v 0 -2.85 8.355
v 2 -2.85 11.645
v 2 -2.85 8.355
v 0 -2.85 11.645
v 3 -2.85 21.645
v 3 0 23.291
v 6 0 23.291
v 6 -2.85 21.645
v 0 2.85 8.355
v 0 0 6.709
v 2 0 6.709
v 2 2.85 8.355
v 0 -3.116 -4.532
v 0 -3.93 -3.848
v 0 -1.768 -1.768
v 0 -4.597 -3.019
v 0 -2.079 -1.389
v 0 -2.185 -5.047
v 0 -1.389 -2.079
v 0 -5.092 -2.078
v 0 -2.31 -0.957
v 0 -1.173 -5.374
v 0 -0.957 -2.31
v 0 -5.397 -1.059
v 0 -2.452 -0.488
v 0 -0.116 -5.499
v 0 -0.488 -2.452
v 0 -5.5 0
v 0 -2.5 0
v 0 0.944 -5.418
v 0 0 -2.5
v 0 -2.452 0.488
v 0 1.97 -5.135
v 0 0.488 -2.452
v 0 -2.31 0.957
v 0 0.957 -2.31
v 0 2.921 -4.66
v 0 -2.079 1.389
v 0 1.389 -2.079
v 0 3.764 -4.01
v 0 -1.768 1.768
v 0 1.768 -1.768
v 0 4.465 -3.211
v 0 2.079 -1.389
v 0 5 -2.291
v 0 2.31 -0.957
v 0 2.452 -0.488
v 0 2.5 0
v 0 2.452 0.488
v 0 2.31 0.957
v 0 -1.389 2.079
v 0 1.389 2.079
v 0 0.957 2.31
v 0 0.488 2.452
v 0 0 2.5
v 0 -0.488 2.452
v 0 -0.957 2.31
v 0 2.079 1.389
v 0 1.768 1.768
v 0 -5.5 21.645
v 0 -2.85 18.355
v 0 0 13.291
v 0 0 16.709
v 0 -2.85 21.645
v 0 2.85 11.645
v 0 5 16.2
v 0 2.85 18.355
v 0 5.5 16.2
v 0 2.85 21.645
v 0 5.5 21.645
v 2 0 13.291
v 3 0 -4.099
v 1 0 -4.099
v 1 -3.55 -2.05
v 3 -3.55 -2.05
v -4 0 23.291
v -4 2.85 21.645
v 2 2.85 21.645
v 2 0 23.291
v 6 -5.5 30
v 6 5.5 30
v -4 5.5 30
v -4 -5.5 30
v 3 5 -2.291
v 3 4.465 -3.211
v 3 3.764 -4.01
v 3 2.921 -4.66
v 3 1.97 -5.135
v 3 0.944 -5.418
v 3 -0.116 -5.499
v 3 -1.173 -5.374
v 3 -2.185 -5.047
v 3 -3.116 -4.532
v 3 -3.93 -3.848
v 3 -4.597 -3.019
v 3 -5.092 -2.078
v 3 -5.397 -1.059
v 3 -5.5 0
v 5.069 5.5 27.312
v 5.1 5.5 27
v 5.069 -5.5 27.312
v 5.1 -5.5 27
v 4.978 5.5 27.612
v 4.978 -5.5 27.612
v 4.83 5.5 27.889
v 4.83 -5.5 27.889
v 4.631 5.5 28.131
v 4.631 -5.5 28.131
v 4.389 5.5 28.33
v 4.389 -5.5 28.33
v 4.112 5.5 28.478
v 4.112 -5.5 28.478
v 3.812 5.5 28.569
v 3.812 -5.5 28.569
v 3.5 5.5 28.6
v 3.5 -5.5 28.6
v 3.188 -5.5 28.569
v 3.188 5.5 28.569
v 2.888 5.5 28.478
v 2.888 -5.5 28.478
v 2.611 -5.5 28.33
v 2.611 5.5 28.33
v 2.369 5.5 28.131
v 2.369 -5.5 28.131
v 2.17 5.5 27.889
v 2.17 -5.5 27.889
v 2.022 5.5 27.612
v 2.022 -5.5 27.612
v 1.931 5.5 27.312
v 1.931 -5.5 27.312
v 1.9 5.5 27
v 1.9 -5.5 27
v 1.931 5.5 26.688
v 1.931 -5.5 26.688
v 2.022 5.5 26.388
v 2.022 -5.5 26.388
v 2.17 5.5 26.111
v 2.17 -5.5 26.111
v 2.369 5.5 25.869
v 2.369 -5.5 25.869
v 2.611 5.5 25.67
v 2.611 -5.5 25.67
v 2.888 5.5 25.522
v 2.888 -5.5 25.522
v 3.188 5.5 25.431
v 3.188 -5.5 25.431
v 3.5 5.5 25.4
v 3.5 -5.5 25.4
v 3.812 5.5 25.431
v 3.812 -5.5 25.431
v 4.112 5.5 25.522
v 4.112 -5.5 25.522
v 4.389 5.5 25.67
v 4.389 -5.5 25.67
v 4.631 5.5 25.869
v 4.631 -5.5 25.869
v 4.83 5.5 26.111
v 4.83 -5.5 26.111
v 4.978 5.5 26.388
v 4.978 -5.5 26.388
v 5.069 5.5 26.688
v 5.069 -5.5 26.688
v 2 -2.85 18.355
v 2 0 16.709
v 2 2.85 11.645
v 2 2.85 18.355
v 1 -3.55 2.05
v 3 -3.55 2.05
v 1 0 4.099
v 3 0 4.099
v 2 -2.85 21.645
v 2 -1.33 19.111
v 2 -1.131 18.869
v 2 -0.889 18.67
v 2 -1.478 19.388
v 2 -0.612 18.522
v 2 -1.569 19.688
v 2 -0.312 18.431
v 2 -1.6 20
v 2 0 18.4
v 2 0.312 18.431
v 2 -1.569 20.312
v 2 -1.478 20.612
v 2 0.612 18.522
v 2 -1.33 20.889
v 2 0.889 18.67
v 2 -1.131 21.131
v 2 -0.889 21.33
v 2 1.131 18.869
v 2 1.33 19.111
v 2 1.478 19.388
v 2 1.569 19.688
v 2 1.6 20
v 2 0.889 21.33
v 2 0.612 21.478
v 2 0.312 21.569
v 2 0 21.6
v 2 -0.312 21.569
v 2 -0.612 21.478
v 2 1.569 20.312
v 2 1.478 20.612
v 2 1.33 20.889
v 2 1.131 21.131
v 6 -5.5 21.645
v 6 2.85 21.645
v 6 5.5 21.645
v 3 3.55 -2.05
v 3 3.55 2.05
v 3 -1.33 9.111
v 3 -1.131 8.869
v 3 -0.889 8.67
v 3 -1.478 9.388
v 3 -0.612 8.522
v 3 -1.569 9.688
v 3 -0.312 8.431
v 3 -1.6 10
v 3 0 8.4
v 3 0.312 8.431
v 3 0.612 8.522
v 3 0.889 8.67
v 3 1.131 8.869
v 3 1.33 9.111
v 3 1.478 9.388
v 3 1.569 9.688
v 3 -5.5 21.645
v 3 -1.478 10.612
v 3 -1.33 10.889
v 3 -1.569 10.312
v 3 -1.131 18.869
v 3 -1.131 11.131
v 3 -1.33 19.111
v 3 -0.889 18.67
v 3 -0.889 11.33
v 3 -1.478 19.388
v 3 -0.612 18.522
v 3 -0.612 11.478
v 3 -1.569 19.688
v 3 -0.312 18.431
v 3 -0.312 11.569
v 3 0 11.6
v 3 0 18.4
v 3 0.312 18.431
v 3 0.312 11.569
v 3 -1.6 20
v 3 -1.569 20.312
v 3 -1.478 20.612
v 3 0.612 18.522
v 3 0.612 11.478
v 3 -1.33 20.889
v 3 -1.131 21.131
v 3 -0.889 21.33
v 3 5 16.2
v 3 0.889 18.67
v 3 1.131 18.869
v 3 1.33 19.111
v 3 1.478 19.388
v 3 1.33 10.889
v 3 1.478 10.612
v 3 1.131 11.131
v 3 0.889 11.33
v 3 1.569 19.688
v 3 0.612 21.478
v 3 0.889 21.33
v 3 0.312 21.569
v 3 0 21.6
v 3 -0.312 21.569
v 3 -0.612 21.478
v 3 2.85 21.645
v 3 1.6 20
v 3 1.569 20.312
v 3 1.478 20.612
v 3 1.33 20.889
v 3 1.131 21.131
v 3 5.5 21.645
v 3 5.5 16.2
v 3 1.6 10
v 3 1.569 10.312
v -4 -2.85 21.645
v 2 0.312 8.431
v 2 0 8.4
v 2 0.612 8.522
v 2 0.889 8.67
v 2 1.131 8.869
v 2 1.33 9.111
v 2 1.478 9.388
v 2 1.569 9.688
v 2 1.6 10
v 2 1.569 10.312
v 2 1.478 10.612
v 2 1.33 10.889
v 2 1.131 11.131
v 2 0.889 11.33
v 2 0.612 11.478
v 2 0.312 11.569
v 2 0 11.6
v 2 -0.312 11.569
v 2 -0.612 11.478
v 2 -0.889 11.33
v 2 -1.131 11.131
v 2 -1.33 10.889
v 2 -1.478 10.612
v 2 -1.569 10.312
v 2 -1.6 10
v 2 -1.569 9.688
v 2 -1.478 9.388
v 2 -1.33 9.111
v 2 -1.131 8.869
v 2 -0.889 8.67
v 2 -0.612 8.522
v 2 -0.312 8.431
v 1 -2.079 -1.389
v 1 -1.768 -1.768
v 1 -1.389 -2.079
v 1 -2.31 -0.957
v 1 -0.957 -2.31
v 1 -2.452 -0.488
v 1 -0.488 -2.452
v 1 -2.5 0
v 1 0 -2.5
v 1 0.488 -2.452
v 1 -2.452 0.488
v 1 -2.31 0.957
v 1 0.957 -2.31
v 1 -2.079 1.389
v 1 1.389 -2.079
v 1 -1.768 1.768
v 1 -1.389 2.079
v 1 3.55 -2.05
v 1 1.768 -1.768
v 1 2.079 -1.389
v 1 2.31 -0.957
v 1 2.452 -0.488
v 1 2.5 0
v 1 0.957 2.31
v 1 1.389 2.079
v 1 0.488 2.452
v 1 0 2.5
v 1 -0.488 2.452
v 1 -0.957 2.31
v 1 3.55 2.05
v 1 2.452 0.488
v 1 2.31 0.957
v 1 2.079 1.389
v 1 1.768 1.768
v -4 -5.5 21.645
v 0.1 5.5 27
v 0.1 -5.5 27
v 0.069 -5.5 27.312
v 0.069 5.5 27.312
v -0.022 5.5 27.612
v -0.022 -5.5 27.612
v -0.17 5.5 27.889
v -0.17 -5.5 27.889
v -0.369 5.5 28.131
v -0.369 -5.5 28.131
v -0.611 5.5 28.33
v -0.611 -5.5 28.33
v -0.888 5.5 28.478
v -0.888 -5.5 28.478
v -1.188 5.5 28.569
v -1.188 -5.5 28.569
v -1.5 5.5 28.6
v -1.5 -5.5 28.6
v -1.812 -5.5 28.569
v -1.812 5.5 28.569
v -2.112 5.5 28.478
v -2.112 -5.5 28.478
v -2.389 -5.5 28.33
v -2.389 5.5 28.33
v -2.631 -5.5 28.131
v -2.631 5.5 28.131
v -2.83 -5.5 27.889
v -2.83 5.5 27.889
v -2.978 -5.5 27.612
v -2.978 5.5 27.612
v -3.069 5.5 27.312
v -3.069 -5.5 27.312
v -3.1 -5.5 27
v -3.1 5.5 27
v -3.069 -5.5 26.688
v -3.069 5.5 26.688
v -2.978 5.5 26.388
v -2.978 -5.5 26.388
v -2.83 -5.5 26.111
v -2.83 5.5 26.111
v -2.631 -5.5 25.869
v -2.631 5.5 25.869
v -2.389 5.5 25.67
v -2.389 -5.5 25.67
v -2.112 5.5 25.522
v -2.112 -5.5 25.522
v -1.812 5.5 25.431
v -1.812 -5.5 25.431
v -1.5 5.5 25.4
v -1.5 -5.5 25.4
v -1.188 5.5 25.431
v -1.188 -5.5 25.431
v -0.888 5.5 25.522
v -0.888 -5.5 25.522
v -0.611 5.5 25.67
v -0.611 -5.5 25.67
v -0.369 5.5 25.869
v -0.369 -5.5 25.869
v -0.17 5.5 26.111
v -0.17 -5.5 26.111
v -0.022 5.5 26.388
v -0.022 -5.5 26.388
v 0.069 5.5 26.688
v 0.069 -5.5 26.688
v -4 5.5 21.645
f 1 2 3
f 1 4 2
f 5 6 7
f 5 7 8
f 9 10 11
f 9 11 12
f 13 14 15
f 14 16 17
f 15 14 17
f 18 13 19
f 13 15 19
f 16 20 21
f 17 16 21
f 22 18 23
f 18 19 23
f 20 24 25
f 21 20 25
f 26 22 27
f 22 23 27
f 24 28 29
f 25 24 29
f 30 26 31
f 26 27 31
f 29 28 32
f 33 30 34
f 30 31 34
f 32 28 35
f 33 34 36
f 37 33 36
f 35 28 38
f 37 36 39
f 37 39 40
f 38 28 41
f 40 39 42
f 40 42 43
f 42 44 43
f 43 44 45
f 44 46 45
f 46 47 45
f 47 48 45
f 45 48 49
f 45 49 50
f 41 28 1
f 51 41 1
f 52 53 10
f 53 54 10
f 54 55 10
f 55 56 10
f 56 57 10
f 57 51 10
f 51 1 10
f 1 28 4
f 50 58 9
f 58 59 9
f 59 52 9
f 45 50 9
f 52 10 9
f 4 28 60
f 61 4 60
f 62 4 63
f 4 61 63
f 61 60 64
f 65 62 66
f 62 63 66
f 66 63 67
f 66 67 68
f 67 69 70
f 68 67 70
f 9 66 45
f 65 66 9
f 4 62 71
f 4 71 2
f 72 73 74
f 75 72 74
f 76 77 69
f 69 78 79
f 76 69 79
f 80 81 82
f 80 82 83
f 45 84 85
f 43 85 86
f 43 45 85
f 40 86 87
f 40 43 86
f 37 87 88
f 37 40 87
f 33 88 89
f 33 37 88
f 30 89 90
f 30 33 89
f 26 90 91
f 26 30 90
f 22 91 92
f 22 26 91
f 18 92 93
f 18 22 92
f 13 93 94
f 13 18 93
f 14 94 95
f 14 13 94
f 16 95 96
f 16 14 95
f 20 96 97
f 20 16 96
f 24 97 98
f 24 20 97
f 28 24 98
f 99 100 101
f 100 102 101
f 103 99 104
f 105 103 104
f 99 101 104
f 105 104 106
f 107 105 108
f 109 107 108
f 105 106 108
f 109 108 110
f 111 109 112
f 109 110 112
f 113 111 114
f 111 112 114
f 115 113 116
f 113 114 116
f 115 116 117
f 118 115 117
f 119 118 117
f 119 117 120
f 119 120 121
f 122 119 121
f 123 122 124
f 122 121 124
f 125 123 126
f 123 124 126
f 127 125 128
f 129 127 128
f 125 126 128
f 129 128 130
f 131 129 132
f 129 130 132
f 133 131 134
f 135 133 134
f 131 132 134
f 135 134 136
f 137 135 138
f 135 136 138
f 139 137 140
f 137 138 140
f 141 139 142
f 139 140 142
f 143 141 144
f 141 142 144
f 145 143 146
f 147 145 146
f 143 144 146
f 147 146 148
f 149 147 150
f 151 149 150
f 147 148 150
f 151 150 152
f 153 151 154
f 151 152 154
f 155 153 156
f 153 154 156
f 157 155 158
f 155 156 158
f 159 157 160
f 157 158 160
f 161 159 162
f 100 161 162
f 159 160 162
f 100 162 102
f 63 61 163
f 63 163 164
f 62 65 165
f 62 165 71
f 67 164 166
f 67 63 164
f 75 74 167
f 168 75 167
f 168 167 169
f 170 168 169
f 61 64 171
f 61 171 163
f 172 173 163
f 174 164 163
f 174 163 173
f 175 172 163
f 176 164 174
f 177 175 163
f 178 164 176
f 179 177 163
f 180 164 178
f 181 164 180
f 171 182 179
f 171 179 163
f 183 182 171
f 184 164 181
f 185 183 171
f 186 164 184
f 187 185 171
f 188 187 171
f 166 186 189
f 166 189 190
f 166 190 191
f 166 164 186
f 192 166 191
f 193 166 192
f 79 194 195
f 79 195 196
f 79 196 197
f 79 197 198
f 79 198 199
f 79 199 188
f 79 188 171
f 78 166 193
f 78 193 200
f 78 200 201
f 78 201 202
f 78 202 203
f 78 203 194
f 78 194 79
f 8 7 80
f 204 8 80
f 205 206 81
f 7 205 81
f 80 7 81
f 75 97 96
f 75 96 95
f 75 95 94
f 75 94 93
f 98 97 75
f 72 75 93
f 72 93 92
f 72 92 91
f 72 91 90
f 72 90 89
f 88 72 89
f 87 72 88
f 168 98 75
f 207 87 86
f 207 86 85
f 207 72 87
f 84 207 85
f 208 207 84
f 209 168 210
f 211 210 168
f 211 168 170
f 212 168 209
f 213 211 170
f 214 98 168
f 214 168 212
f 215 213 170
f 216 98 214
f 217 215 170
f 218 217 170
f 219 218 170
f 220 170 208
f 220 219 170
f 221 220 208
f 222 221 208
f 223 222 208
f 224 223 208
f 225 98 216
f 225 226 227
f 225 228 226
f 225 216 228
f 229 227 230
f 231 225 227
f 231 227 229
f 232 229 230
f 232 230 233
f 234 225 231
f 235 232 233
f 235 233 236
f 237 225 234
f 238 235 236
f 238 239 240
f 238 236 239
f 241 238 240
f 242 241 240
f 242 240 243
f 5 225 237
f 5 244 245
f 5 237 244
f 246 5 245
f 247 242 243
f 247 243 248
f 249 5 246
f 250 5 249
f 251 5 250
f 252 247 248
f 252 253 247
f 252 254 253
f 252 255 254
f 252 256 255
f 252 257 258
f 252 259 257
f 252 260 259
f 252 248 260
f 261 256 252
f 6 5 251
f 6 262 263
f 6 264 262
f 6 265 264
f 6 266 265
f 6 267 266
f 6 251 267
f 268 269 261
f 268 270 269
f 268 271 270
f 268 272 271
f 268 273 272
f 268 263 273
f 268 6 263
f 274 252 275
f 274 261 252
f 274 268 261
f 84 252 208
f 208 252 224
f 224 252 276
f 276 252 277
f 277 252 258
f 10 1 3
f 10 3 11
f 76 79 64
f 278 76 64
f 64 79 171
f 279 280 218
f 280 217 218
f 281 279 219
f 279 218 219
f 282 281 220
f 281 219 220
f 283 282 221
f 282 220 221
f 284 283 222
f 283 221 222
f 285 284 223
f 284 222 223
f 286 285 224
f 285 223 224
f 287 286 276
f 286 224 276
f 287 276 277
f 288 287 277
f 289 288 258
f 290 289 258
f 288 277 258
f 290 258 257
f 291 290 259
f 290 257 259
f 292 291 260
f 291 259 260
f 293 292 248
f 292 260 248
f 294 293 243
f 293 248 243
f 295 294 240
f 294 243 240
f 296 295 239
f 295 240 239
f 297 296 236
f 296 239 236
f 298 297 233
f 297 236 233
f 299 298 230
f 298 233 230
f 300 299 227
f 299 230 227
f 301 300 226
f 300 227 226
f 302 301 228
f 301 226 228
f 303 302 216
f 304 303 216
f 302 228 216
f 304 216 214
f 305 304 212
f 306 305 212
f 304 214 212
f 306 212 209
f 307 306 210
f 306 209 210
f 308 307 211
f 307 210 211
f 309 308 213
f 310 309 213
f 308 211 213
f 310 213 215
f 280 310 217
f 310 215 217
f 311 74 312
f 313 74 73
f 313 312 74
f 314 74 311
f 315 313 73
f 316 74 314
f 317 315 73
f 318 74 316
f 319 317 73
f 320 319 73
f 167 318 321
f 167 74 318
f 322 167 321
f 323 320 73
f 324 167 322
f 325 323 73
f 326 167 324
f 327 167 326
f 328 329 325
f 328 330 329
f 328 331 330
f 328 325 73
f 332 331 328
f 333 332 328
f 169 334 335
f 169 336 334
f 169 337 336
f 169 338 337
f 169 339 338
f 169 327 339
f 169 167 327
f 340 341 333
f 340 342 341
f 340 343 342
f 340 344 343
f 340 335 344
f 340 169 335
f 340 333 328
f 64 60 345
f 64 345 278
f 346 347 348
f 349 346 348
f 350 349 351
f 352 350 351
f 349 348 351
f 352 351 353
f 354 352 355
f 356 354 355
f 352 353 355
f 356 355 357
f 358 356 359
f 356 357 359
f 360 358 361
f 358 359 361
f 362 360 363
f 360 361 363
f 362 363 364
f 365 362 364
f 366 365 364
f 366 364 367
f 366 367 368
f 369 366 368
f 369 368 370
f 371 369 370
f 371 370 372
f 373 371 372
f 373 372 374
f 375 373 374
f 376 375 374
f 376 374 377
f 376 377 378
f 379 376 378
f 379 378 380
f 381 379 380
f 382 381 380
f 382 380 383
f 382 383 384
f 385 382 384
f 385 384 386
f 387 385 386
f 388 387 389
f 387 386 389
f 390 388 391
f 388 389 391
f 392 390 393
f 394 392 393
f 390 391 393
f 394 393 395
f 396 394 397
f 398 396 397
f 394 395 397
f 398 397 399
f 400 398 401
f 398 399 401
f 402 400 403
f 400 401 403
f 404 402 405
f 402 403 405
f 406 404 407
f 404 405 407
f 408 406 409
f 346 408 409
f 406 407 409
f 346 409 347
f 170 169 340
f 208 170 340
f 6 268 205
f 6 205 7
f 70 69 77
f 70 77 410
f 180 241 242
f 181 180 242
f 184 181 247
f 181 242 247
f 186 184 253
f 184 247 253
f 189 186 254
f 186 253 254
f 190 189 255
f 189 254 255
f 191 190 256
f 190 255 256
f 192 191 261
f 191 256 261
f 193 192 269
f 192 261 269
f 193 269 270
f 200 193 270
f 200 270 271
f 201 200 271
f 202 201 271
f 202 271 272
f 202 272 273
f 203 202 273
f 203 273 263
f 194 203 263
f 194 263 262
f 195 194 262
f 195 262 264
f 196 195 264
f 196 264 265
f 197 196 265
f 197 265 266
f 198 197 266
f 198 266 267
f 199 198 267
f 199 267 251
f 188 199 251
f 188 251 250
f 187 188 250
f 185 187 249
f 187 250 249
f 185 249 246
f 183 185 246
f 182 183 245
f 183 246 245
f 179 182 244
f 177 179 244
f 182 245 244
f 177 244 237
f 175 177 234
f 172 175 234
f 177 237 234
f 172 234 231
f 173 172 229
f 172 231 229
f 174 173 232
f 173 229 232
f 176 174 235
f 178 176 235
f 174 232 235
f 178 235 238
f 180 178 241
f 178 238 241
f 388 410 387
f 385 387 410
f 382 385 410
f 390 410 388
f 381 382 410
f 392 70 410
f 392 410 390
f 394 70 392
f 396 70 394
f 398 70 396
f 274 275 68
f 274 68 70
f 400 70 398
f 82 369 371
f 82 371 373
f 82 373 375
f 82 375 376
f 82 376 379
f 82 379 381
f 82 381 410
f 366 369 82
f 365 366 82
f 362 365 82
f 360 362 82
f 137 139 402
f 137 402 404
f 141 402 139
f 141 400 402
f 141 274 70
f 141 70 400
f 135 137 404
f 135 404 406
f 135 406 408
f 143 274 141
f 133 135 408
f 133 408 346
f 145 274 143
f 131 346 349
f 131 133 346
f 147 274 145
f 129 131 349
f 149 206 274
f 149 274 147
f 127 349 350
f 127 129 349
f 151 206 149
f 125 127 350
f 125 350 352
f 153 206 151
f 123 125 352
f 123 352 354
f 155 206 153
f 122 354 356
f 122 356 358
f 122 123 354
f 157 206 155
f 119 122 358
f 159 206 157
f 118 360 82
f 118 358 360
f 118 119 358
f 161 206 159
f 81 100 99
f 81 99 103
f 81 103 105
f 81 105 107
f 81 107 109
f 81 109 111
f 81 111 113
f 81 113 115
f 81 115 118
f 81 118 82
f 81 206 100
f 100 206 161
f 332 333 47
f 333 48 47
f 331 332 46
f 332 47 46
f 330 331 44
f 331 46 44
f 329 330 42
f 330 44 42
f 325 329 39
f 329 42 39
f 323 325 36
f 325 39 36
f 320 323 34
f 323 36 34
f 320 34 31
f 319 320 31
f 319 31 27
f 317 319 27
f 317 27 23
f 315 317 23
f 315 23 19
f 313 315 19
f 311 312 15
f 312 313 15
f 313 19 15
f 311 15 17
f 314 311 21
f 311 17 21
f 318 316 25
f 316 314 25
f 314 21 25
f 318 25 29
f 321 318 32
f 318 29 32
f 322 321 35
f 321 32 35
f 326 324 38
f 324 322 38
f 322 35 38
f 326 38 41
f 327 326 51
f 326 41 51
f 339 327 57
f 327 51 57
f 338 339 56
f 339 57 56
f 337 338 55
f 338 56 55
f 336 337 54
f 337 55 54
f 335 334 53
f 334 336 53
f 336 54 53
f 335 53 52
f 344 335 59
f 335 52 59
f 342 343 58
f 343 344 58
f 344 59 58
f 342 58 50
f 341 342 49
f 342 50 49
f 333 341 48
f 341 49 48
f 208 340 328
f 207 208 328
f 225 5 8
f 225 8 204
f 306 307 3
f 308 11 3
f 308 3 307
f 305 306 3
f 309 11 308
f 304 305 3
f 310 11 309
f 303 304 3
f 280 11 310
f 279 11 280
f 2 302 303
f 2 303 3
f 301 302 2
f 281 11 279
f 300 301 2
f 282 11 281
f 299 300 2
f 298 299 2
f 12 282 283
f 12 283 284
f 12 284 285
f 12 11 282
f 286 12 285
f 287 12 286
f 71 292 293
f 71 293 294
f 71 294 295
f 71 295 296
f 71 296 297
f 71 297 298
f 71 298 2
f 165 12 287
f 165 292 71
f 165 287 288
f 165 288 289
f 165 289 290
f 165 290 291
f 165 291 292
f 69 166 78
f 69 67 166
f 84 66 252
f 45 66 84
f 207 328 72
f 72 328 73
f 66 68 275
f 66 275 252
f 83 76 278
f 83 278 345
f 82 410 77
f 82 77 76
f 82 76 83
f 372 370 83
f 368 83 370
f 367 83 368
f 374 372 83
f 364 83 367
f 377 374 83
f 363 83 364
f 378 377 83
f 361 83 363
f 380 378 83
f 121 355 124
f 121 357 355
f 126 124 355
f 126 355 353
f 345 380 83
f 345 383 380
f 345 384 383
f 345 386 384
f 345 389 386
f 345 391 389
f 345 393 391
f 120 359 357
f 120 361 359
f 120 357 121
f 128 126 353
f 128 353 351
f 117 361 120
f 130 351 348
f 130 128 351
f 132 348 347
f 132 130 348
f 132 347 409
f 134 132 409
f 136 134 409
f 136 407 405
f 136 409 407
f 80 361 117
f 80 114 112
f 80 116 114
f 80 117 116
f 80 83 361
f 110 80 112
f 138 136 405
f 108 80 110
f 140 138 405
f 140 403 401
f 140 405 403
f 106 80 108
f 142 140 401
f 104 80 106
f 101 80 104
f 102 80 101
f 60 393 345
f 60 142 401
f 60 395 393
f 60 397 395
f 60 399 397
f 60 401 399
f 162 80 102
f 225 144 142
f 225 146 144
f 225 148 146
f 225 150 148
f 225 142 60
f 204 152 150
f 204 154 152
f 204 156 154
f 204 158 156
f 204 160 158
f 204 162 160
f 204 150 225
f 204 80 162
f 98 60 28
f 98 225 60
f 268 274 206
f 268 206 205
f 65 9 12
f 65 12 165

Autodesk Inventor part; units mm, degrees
ref_plane "YZ Plane" through (0, 0, 0) normal (1, 0, 0) x (0, 1, 0)
ref_plane "XZ Plane" through (0, 0, 0) normal (0, 1, 0) x (-1, 0, 0)
ref_plane "XY Plane" through (0, 0, 0) normal (0, 0, 1) x (1, 0, 0)
sketch "スケッチ1" plane through (0, 0, 0) normal (1, 0, 0) x (0, 1, 0)
  circle A0 centre (0, 0) radius 2.5
  line L0 (0, 4.0992) -> (3.55, 2.0496)
  line L1 (3.55, 2.0496) -> (3.55, -2.0496)
  line L2 (3.55, -2.0496) -> (0, -4.0992)
  line L3 (0, -4.0992) -> (-3.55, -2.0496)
  line L4 (-3.55, -2.0496) -> (-3.55, 2.0496)
  line L5 (-3.55, 2.0496) -> (0, 4.0992)
  circle A1 centre (0, 0) radius 5.5
  line L6 (5.5, 0) -> (-5.5, 0) construction
  line L7 (-5.5, 0) -> (-5.5, 30)
  line L8 (-5.5, 30) -> (5.5, 30)
  line L9 (5.5, 30) -> (5.5, 0)
  dimension "d2" = 11
  dimension "d0" = 5
  dimension "d1" = 7.1
  dimension "d3" = 30
extrude "押し出し1" add sketch "スケッチ1" along normal blind 3 contours A1 | A1 L7 L8 L9
extrude "押し出し2" add sketch "スケッチ1" along normal blind 1 contours L0 L1 L2 L3 L4 L5
sketch "スケッチ2" plane through (3, 0, 0) normal (1, 0, 0) x (0, 0, -1)
  circle A0 centre (-10, 0) radius 1.6
  circle A1 centre (-20, 0) radius 1.6
  point P0 (0, 0)
  dimension "d8" = 3.2
  dimension "d9" = 3.2
  dimension "d10" = 10
  dimension "d11" = 10
extrude "押し出し3" cut sketch "スケッチ2" against normal through all
sketch "スケッチ3" plane through (0, 0, 0) normal (-1, 0, 0) x (0, 0, 1)
  circle A0 centre (20, 0) radius 1.6 projected
  circle A1 centre (10, 0) radius 1.6 projected
  line L0 (21.6454, -2.85) -> (18.3546, -2.85)
  line L1 (18.3546, -2.85) -> (16.7091, 0)
  line L2 (16.7091, 0) -> (18.3546, 2.85)
  line L3 (18.3546, 2.85) -> (21.6454, 2.85)
  line L4 (21.6454, 2.85) -> (23.2909, 0)
  line L5 (23.2909, 0) -> (21.6454, -2.85)
  line L6 (11.6454, -2.85) -> (8.3546, -2.85)
  line L7 (8.3546, -2.85) -> (6.7091, 0)
  line L8 (6.7091, 0) -> (8.3546, 2.85)
  line L9 (8.3546, 2.85) -> (11.6454, 2.85)
  line L10 (11.6454, 2.85) -> (13.2909, 0)
  line L11 (13.2909, 0) -> (11.6454, -2.85)
  point P0 (0, 0)
  dimension "d14" = 5.7
extrude "押し出し4" cut sketch "スケッチ3" against normal blind 2
sketch "スケッチ4" plane through (0, 0, 0) normal (-1, 0, 0) x (0, 0, 1)
  line L0 (16.2, 5) -> (-2.2913, 5) projected
  line L1 (16.2, 5.5) -> (16.2, 5) projected
  arc A0 (21.2458, 6.2407) -> (21.5454, 6.0705) centre (23.8648, 10.5) ccw projected
  line L2 (21.5454, 6.0705) -> (16.2, 6.0705)
  line L3 (16.2, 6.0705) -> (16.2, 5.8705)
  line L4 (16.2, 5.8705) -> (21.5454, 5.8705)
  line L5 (21.5454, 5.8705) -> (21.5454, 6.0705)
  arc A1 (0, 5.5) -> (0, -5.5) centre (0, 0) ccw projected
  line L6 (0, 5.5) -> (30, 5.5) projected
  point P0 (30, 5.5)
  point P1 (16.2, 5.3)
  dimension "d17" = 0.2
extrude "押し出し5" cut sketch "スケッチ4" against normal through all
sketch "スケッチ5" plane through (0, 0, 0) normal (-1, 0, 0) x (0, 0, 1)
  line L0 (23.2909, 0) -> (21.6454, -2.85) projected
  line L1 (21.6454, 2.85) -> (23.2909, 0) projected
  line L2 (30, -5.5) -> (0, -5.5) projected
  line L3 (21.6454, -5.5) -> (21.6454, 5.5)
  line L4 (16.2, 5.5) -> (30, 5.5) projected
  line L5 (23.8648, 5.5) -> (23.8648, 5.3) projected
  line L6 (30, 5.5) -> (30, -5.5) projected
  line L7 (30, 5.5) -> (16.1, 5.5) projected
  point P0 (0, 0)
extrude "押し出し6" add sketch "スケッチ5" along normal blind 4 contours L1 L3 L4 L6 L2 L0
sketch "スケッチ7" plane through (-4, 0, 0) normal (-1, 0, 0) x (0, 0, 1)
  line L0 (30, 5.5) -> (21.6454, 5.5) projected
  line L1 (21.6454, 5.5) -> (21.6454, 2.85) projected
  line L2 (21.6454, 2.85) -> (23.2909, 0) projected
  line L3 (23.2909, 0) -> (21.6454, -2.85) projected
  line L4 (21.6454, -2.85) -> (21.6454, -5.5) projected
  line L5 (21.6454, -5.5) -> (30, -5.5) projected
  line L6 (30, -5.5) -> (30, 5.5) projected
  point P0 (0, 0)
extrude "押し出し7" add sketch "スケッチ7" against normal blind 10
sketch "スケッチ8" plane through (0, -5.5, 0) normal (0, -1, 0) x (1, 0, 0)
  circle A0 centre (3.5, 27) radius 1.6
  circle A1 centre (-1.5, 27) radius 1.6
  line L0 (6, 30) -> (6, 21.6454) projected
  line L1 (-4, 21.6454) -> (-4, 30) projected
  line L2 (-4, 30) -> (6, 30) projected
  point P0 (0, 0)
  dimension "d24" = 3.2
  dimension "d25" = 3.2
  dimension "d26" = 2.5
  dimension "d27" = 2.5
  dimension "d28" = 3
extrude "押し出し8" cut sketch "スケッチ8" against normal through all
equation "\"d11\" = d10"
equation "\"d27\" = d26"
properties part number "hand_finger_inside"
